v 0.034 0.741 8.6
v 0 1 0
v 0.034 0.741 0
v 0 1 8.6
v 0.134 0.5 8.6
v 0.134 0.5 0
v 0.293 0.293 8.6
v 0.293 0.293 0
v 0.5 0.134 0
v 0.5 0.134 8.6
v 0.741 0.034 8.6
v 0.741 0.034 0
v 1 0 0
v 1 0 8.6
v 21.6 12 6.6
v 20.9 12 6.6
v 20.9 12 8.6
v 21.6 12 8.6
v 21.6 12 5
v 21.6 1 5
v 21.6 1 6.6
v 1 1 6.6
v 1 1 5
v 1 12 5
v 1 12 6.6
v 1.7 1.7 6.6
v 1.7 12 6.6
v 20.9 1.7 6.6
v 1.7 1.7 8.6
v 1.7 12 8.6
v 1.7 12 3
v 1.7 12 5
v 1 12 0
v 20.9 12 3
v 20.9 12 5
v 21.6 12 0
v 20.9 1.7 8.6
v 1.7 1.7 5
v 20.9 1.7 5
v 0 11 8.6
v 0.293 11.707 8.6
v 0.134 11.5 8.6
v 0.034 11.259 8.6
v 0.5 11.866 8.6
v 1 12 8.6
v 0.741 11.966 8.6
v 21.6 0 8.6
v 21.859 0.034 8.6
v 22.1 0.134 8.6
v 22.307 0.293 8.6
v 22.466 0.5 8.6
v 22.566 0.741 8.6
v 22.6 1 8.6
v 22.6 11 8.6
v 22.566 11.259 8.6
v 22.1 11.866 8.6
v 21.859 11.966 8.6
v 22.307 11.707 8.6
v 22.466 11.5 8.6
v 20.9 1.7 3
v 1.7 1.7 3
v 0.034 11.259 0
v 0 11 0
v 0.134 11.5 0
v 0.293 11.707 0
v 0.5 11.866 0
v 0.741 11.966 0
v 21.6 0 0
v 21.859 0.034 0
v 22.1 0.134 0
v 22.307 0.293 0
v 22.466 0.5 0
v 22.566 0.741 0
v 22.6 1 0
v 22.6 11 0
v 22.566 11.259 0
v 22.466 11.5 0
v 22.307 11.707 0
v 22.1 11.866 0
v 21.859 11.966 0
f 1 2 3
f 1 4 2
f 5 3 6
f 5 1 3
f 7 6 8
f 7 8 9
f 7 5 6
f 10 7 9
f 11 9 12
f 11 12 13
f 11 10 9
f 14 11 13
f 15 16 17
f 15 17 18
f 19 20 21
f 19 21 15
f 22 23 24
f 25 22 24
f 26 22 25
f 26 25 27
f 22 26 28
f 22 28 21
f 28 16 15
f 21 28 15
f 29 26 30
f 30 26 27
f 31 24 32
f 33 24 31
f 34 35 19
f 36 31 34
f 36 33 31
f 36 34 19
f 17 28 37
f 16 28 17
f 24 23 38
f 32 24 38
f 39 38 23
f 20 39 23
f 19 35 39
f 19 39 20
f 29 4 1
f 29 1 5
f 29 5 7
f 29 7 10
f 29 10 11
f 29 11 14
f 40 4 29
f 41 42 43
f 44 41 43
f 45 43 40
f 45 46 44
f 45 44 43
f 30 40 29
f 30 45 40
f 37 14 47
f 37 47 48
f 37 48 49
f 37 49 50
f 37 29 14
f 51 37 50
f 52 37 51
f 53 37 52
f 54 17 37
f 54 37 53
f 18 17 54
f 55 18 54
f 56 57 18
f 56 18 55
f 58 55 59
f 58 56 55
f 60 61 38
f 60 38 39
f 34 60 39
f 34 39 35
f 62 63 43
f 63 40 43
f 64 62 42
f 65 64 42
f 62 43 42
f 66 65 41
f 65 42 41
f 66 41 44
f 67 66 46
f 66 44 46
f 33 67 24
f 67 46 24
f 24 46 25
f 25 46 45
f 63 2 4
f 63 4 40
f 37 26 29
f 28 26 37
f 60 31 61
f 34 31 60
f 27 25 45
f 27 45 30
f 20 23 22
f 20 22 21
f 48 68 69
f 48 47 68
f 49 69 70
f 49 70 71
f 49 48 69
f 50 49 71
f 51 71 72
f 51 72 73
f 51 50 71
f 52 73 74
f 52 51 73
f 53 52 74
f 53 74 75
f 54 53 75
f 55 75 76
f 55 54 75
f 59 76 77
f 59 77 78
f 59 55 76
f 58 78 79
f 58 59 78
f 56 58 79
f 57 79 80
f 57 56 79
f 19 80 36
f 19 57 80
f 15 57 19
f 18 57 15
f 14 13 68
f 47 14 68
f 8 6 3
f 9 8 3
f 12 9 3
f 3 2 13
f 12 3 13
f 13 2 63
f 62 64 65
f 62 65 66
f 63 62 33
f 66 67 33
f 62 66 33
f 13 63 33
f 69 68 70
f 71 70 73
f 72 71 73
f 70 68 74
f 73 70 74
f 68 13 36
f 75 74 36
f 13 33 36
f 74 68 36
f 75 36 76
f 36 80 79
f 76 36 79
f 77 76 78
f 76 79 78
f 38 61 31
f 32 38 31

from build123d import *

# Parameters (mm, degrees)
BOX007_W     = 20.6
BOX007_H     = 11
BOX007_DEPTH = 1.6
BOX006_W     = 19.2
BOX006_H     = 10.6
BOX006_DEPTH = 5.6
BOX_W        = 22.6
BOX_H        = 12
BOX_DEPTH    = 8.6
FILLET_R     = 1


with BuildPart() as pcb_extract_cube:
    # Box007 → Box007 (new body)
    with BuildSketch(Plane(origin=(1, 1, 5), x_dir=(1, 0, 0), z_dir=(0, 0, 1))):
        with Locations((10.3, 5.5)):
            Rectangle(BOX007_W, BOX007_H)
    extrude(amount=BOX007_DEPTH)


with BuildPart() as extract_fusion:
    # Box006 → Box006 (new body)
    with BuildSketch(Plane(origin=(1.7, 1.7, 3), x_dir=(1, 0, 0), z_dir=(0, 0, 1))):
        with Locations((9.6, 5.3)):
            Rectangle(BOX006_W, BOX006_H)
    extrude(amount=BOX006_DEPTH)

    # Fusion: union pcb extract cube
    add(pcb_extract_cube.part)


with BuildPart() as hw_613_cut001:
    # Box → Box (new body)
    with BuildSketch(Plane.XY):
        with Locations((11.3, 6)):
            Rectangle(BOX_W, BOX_H)
    extrude(amount=BOX_DEPTH)

    # Fillet
    fillet_edges = [hw_613_cut001.edges().sort_by_distance(p)[0] for p in [
        (0, 0, 4.3),
        (0, 12, 4.3),
        (22.6, 0, 4.3),
        (22.6, 12, 4.3),
    ]]
    fillet(fillet_edges, radius=FILLET_R)

    # Cut003006: cut extract fusion
    add(extract_fusion.part, mode=Mode.SUBTRACT)


solid = hw_613_cut001.part
